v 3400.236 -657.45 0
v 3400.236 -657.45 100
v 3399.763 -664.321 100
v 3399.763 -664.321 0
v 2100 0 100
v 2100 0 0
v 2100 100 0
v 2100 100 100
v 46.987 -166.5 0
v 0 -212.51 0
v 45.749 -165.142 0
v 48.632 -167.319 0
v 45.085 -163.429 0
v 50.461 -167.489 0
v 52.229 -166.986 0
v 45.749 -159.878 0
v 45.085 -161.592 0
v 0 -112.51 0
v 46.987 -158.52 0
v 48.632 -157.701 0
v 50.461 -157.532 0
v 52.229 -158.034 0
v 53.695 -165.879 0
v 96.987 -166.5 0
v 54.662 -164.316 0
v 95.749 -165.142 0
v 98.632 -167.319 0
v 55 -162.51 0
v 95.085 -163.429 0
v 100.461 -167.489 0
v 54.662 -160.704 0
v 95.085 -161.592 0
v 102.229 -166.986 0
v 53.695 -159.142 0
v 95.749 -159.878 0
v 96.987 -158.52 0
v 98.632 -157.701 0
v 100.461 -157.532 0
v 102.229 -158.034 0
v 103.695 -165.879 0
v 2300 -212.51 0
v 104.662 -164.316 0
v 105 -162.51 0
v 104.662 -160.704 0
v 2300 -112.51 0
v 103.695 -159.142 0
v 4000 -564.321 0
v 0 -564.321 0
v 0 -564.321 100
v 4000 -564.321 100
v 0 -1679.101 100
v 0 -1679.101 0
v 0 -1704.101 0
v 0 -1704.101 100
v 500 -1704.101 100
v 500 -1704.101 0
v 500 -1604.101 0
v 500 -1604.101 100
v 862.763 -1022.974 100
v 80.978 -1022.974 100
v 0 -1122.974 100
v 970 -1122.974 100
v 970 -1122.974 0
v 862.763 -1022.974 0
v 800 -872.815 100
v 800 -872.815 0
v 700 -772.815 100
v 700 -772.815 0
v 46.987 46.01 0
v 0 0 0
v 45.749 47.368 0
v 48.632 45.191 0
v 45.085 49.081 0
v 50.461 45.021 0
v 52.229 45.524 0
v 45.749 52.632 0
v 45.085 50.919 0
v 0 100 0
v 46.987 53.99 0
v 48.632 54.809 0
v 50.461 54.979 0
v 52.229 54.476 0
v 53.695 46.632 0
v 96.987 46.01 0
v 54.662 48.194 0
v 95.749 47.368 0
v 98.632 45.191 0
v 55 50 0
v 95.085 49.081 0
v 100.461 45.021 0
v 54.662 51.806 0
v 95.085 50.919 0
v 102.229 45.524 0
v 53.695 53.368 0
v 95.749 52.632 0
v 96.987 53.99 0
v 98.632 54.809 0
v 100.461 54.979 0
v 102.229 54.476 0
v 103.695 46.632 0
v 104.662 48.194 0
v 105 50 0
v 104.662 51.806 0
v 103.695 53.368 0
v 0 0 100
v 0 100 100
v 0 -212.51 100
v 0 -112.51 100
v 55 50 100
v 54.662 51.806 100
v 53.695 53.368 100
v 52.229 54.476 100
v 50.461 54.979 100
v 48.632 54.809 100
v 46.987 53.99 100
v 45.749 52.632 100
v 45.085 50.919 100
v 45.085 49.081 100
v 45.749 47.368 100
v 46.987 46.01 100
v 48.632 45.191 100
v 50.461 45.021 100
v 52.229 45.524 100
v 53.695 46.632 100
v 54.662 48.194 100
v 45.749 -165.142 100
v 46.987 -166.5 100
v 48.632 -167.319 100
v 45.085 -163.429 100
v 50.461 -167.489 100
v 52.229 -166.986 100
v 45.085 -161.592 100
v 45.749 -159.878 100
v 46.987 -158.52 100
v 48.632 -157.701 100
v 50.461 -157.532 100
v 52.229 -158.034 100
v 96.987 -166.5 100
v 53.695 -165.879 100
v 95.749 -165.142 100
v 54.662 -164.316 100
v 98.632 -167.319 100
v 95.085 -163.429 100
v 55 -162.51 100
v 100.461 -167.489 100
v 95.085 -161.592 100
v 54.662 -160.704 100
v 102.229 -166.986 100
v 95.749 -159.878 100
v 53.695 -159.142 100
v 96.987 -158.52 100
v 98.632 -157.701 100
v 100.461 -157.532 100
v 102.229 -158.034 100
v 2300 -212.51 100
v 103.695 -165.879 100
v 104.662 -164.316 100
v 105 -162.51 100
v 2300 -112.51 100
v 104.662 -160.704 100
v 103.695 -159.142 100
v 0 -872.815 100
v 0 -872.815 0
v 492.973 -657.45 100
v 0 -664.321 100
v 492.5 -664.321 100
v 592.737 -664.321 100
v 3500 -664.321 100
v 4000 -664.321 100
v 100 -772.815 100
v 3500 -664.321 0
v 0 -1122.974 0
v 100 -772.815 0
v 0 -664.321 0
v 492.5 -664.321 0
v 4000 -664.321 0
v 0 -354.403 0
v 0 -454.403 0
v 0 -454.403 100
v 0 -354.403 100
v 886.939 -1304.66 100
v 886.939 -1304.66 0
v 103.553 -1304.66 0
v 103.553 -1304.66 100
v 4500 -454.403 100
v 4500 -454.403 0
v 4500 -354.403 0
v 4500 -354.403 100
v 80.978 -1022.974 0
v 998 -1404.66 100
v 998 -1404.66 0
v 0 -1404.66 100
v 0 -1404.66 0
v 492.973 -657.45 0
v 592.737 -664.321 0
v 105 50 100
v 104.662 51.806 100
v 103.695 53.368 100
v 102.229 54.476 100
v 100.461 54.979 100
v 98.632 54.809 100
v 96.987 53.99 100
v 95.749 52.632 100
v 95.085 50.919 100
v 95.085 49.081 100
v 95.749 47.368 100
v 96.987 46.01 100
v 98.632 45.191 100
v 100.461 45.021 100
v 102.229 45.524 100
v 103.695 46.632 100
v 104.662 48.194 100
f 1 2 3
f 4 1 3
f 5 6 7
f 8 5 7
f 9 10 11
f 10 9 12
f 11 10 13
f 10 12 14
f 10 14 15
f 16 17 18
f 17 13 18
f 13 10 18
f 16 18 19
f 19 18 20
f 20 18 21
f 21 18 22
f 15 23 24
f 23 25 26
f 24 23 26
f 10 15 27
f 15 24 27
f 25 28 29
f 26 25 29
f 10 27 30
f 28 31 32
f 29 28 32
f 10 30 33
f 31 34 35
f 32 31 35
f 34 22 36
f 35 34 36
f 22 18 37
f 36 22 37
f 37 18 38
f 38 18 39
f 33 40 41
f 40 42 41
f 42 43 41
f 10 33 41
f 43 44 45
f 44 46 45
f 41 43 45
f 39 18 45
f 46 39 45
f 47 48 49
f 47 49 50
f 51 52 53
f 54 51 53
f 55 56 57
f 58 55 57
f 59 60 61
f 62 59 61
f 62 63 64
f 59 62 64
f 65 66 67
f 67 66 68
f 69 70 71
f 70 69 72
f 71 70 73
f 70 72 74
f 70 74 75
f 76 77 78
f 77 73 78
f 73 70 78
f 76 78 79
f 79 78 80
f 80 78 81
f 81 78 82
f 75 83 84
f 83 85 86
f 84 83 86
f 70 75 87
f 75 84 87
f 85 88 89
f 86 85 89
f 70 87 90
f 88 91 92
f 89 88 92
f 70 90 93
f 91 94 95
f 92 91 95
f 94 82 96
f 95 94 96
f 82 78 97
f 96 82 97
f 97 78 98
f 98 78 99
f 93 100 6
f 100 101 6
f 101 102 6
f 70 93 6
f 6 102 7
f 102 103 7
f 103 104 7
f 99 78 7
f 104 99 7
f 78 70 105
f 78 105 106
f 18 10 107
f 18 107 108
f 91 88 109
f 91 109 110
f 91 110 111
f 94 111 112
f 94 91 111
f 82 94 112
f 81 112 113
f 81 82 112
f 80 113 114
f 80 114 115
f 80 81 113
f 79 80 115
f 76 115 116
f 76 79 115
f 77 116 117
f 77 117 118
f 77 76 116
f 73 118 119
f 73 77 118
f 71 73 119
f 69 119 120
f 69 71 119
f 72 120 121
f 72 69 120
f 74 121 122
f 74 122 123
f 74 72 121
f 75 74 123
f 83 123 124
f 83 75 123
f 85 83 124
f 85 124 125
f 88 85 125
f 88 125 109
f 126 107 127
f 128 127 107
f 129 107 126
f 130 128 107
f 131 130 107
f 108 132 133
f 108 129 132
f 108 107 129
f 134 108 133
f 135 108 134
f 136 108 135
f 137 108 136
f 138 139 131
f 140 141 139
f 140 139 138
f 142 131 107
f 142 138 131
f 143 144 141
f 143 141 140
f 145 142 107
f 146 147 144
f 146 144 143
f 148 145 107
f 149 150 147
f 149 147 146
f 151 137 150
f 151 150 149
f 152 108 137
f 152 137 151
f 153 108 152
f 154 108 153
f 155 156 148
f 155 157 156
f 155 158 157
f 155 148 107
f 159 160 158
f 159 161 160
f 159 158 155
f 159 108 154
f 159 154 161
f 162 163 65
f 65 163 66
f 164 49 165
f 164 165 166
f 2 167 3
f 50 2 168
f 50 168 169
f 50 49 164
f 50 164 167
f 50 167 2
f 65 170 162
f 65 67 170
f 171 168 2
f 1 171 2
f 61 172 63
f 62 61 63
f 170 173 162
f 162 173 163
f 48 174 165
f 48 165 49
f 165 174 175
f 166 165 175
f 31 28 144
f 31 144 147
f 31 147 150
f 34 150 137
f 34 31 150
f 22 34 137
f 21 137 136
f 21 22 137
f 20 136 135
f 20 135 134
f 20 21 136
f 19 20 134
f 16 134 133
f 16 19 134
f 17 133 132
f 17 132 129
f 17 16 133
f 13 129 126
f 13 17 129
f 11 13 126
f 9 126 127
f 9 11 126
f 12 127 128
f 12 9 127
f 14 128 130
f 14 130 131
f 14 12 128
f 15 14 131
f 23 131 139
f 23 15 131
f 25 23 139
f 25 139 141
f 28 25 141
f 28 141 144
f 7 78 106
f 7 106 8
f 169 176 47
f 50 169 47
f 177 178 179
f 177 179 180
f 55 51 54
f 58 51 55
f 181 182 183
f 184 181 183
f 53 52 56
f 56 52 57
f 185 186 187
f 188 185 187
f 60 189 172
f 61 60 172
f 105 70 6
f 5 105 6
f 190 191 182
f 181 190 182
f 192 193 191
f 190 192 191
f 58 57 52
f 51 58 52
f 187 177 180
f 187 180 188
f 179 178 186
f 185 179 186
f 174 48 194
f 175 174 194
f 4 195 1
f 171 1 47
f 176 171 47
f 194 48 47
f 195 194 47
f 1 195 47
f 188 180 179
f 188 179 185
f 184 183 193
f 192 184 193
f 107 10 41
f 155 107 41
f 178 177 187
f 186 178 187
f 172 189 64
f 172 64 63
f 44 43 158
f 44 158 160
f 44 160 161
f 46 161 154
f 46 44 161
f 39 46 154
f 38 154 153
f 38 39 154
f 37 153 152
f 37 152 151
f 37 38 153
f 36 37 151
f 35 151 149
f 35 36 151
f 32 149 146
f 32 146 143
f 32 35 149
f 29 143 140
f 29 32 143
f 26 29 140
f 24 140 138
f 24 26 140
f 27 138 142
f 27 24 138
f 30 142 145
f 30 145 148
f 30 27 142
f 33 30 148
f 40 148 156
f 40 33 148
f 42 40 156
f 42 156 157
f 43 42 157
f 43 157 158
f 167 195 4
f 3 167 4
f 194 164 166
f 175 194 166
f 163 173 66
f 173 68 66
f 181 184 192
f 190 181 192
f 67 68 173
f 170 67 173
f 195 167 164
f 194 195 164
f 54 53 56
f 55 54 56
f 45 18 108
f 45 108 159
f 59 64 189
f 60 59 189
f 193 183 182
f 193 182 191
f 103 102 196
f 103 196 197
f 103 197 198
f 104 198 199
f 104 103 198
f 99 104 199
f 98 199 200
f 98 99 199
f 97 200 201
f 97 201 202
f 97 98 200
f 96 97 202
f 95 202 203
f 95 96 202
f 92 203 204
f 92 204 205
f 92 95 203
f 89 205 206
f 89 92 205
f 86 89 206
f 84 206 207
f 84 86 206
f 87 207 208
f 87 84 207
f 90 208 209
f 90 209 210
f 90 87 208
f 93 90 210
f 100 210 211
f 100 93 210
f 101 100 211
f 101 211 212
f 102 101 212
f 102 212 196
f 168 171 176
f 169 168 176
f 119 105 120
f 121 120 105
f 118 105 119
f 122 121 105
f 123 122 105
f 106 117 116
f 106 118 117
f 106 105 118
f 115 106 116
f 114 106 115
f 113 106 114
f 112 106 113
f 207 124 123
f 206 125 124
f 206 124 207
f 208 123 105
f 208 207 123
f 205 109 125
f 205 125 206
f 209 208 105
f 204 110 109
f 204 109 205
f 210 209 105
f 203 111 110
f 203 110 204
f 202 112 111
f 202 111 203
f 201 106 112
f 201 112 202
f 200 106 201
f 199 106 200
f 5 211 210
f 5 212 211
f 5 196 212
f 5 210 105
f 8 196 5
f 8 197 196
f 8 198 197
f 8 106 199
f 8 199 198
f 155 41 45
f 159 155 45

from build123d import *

# Parameters (mm, degrees)
F0_W     = 2100
F0_H     = 100
F0_R     = 5
F1_DEPTH = 100
F0_W_2   = 2300
F0_W_3   = 4500
F0_W_4   = 4000
F2_R     = 5
F3_DEPTH = 50
F5_DEPTH = 100


# Not quite as in the source:
# - a feature names something its author has since deleted; it is built from what else it names


with BuildPart() as f1:
    # F0 (on Top) → F1 (new body)
    with BuildSketch(Plane.XY):
        with Locations((1050, 50)):
            Rectangle(F0_W, F0_H)
        with Locations((50, 50)):
            Circle(F0_R, mode=Mode.SUBTRACT)
        with Locations((100, 50)):
            Circle(F0_R, mode=Mode.SUBTRACT)
    extrude(amount=F1_DEPTH)

    # F2 (on face) → F3 (cut)
    with BuildSketch(Plane(origin=(0, -354.4026255608, 0), x_dir=(-1, 0, 0), z_dir=(0, 1, 0))):
        with Locations((100, 50)):
            Circle(F2_R)
        with Locations((50, 50)):
            Circle(F2_R)
    extrude(amount=-F3_DEPTH, mode=Mode.SUBTRACT)


with BuildPart() as f1b:
    # F0 (on Top) → F1, piece 2 (new body)
    with BuildSketch(Plane.XY):
        with Locations((1150, -162.5102728605)):
            Rectangle(F0_W_2, F0_H)
        with Locations((50, -162.5102728605)):
            Circle(F0_R, mode=Mode.SUBTRACT)
        with Locations((100, -162.5102728605)):
            Circle(F0_R, mode=Mode.SUBTRACT)
    extrude(amount=F1_DEPTH)


with BuildPart() as f1c:
    # F0 (on Top) → F1, piece 3 (new body)
    with BuildSketch(Plane.XY):
        with Locations((2250, -404.4026255608)):
            Rectangle(F0_W_3, F0_H)
    extrude(amount=F1_DEPTH)


with BuildPart() as f1d:
    # F0 (on Top) → F1, piece 4 (new body)
    with BuildSketch(Plane.XY):
        with Locations((2000, -614.3207073212)):
            Rectangle(F0_W_4, F0_H)
    extrude(amount=F1_DEPTH)

    # F4 (on face) → F5 (cut)
    with BuildSketch(Plane.XY.offset(100)):
        Polygon((3500, -664.3207073212), (3400.2363447921, -657.4495284155), (3399.763095296, -664.3207073212), align=None)
        Polygon((492.5, -664.3207073212), (592.736904704, -664.3207073212), (492.9732494961, -657.4495284155), align=None)
    extrude(amount=-F5_DEPTH, mode=Mode.SUBTRACT)


with BuildPart() as f1e:
    # F0 (on Top) → F1, piece 5 (new body)
    with BuildSketch(Plane.XY):
        Polygon((100, -772.8145360947), (0, -872.8145360947), (800, -872.8145360947), (700, -772.8145360947), align=None)
    extrude(amount=F1_DEPTH)


with BuildPart() as f1f:
    # F0 (on Top) → F1, piece 6 (new body)
    with BuildSketch(Plane.XY):
        Polygon((80.9784033195, -1022.974395752), (0, -1122.974395752), (970, -1122.974395752), (862.7631289975, -1022.974395752), align=None)
    extrude(amount=F1_DEPTH)


with BuildPart() as f1g:
    # F0 (on Top) → F1, piece 7 (new body)
    with BuildSketch(Plane.XY):
        Polygon((103.5530313791, -1304.6602249146), (0, -1404.6602249146), (998, -1404.6602249146), (886.9387485171, -1304.6602249146), align=None)
    extrude(amount=F1_DEPTH)


with BuildPart() as f1h:
    # F0 (on Top) → F1, piece 8 (new body)
    with BuildSketch(Plane.XY):
        Polygon((0, -1679.1014432907), (0, -1704.1014432907), (500, -1704.1014432907), (500, -1604.1014432907), align=None)
    extrude(amount=F1_DEPTH)


solid = Compound([f1.part, f1b.part, f1c.part, f1d.part, f1e.part, f1f.part, f1g.part, f1h.part])
